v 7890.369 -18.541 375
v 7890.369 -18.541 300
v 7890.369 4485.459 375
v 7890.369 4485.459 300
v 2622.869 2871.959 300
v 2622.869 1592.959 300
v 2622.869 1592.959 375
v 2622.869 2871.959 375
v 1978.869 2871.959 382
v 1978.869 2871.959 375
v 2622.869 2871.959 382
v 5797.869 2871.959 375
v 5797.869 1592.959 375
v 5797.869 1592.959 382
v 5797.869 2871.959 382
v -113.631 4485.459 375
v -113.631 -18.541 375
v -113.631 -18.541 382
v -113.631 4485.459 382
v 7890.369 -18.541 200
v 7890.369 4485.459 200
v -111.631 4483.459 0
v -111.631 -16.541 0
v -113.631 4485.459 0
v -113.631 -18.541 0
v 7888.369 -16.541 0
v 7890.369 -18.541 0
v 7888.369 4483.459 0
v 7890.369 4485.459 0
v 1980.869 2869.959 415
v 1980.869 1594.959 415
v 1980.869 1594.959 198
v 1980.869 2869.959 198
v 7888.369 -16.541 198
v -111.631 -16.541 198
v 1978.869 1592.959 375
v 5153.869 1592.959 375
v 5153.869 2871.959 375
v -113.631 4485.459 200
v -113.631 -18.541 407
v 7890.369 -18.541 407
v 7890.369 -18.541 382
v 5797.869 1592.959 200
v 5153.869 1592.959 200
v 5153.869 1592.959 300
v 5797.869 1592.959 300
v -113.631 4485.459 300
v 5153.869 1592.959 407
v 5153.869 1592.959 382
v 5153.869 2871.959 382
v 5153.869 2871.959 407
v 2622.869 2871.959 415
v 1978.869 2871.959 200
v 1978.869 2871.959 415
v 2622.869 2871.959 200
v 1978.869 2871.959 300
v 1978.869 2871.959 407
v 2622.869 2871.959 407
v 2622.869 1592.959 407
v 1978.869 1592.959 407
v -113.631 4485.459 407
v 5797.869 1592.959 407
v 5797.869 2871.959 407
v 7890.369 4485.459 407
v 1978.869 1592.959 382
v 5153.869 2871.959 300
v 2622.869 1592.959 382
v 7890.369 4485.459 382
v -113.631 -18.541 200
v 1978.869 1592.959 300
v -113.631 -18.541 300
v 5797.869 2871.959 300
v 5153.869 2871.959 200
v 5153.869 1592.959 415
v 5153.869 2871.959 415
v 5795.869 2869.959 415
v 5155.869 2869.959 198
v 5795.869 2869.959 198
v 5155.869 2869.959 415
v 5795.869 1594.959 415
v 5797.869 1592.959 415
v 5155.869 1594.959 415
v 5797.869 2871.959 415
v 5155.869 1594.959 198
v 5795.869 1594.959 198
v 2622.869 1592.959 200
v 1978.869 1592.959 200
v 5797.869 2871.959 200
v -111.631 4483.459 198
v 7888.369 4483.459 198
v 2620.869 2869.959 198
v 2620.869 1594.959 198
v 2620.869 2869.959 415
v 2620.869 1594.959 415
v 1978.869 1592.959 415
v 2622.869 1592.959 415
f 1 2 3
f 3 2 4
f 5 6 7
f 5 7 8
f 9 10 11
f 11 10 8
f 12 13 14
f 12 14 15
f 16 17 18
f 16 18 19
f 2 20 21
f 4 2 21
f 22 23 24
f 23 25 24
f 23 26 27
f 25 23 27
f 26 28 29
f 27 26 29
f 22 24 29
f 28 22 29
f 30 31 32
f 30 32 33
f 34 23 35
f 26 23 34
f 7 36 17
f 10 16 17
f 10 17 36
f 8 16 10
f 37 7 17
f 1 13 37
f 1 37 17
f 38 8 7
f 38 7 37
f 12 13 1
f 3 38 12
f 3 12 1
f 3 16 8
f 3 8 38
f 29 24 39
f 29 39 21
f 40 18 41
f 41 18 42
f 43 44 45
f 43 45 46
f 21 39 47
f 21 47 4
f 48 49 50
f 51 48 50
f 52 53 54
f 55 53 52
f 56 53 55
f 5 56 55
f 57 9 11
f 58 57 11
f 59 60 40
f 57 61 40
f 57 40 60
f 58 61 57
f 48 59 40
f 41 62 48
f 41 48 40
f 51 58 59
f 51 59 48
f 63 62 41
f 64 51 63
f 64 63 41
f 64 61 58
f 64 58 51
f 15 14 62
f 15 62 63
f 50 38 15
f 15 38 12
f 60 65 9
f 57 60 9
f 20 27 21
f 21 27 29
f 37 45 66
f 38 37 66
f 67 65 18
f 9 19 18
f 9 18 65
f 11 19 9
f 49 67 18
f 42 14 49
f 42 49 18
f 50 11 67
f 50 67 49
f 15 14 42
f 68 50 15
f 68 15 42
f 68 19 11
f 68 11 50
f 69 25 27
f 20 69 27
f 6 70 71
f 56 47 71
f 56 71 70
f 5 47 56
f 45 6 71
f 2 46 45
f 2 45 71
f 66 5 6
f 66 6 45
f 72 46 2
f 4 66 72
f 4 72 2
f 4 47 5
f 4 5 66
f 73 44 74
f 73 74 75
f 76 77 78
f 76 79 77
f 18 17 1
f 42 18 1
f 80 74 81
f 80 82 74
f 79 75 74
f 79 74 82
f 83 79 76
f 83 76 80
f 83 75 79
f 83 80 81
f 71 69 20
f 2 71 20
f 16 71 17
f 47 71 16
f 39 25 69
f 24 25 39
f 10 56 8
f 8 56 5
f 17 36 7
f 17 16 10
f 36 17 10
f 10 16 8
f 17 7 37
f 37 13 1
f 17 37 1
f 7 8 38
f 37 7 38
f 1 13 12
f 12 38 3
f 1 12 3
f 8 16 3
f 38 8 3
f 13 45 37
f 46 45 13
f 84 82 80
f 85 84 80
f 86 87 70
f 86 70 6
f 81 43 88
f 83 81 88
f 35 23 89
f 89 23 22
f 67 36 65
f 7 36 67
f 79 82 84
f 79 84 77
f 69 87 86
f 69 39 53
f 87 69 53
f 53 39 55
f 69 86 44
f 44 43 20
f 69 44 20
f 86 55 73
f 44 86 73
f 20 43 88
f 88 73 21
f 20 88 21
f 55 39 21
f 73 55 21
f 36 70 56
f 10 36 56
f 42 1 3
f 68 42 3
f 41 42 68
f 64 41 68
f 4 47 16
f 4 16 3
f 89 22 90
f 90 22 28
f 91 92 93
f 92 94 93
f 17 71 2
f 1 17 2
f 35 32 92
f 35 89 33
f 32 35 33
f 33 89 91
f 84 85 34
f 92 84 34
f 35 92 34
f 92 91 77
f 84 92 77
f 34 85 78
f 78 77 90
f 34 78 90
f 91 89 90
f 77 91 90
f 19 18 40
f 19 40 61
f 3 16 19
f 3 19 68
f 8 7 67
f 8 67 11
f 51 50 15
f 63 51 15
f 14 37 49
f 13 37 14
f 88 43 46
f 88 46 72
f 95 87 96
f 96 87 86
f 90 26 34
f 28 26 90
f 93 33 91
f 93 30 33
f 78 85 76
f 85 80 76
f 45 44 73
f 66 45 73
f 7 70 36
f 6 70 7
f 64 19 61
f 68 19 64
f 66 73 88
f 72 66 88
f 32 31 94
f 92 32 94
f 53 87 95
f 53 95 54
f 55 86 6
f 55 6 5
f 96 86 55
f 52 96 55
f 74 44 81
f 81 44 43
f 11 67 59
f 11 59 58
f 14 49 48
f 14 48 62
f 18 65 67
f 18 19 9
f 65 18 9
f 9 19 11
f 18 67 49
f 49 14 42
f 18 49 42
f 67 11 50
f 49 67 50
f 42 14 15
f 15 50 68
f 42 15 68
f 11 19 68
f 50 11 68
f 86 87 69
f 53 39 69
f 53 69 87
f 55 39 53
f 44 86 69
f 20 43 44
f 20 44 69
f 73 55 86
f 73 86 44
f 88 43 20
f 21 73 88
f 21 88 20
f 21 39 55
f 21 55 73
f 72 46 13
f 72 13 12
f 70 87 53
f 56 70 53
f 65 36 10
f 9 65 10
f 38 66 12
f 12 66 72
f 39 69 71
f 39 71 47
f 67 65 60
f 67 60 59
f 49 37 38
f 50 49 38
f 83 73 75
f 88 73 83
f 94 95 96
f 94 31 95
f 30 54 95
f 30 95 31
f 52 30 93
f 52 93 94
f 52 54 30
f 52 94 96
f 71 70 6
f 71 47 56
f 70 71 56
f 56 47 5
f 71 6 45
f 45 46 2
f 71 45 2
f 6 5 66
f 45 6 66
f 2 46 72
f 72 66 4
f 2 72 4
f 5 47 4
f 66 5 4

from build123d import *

# Parameters (mm, degrees)
F0_W      = 8004
F0_H      = 4504
F1_DEPTH  = 200
F2_T      = -2
F3_W      = 644
F3_H      = 1279
F3_W_2    = 640
F3_H_2    = 1275
F4_DEPTH  = 215
F5_DEPTH  = 2
F6_W      = 8004
F6_H      = 4504
F6_W_2    = 644
F6_H_2    = 1279
F7_DEPTH  = 100
F8_DEPTH  = 75
F9_DEPTH  = 7
F10_DEPTH = 25


with BuildPart() as f1:
    # F0 (on Top) → F1 (new body)
    with BuildSketch(Plane.XY):
        with Locations((3888.3689228892, 2233.4590513706)):
            Rectangle(F0_W, F0_H)
    extrude(amount=F1_DEPTH)

    # F2
    f2_openings = [f1.faces().sort_by_distance(p)[0] for p in [
        (3888.368923, 2233.459051, 0),
    ]]
    offset(amount=F2_T, openings=f2_openings)

    # F3 (on face) → F4 (join)
    with BuildSketch(Plane.XY.offset(200)):
        with Locations((5475.8689228892, 2232.4590513706)):
            Rectangle(F3_W, F3_H)
        with Locations((5475.8689228892, 2232.4590513706)):
            Rectangle(F3_W_2, F3_H_2, mode=Mode.SUBTRACT)
        with Locations((2300.8689228892, 2232.4590513706)):
            Rectangle(F3_W, F3_H)
        with Locations((2300.8689228892, 2232.4590513706)):
            Rectangle(F3_W_2, F3_H_2, mode=Mode.SUBTRACT)
    extrude(amount=F4_DEPTH)

    # F5 (cut): faces of the model
    f5_faces = [f1.faces().sort_by_distance(p)[0] for p in [
        (2300.8689228892, 2232.4590513706, 200),
        (5475.8689228892, 2232.4590513706, 200),
    ]]
    extrude(f5_faces, amount=-F5_DEPTH, mode=Mode.SUBTRACT)


with BuildPart() as f7:
    # F6 (on face) → F7 (new body)
    with BuildSketch(Plane.XY.offset(200)):
        with Locations((3888.3689228892, 2233.4590513706)):
            Rectangle(F6_W, F6_H)
        with Locations((2300.8689228892, 2232.4590513706)):
            Rectangle(F6_W_2, F6_H_2, mode=Mode.SUBTRACT)
        with Locations((5475.8689228892, 2232.4590513706)):
            Rectangle(F6_W_2, F6_H_2, mode=Mode.SUBTRACT)
    extrude(amount=F7_DEPTH)


with BuildPart() as f8:
    # F8 (new): a face of the model
    f8_faces = [f7.part.faces().sort_by_distance(p)[0] for p in [
        (3888.3689228892, 2233.5069358019, 300),
    ]]
    extrude(f8_faces, amount=F8_DEPTH)


with BuildPart() as f9:
    # F9 (new): a face of the model
    f9_faces = [f8.part.faces().sort_by_distance(p)[0] for p in [
        (3888.3689228892, 2233.5069358019, 375),
    ]]
    extrude(f9_faces, amount=F9_DEPTH)


with BuildPart() as f10:
    # F10 (new): a face of the model
    f10_faces = [f9.part.faces().sort_by_distance(p)[0] for p in [
        (3888.3689228892, 2233.5069358019, 382),
    ]]
    extrude(f10_faces, amount=F10_DEPTH)


solid = Compound([f1.part, f7.part, f8.part, f9.part, f10.part])
